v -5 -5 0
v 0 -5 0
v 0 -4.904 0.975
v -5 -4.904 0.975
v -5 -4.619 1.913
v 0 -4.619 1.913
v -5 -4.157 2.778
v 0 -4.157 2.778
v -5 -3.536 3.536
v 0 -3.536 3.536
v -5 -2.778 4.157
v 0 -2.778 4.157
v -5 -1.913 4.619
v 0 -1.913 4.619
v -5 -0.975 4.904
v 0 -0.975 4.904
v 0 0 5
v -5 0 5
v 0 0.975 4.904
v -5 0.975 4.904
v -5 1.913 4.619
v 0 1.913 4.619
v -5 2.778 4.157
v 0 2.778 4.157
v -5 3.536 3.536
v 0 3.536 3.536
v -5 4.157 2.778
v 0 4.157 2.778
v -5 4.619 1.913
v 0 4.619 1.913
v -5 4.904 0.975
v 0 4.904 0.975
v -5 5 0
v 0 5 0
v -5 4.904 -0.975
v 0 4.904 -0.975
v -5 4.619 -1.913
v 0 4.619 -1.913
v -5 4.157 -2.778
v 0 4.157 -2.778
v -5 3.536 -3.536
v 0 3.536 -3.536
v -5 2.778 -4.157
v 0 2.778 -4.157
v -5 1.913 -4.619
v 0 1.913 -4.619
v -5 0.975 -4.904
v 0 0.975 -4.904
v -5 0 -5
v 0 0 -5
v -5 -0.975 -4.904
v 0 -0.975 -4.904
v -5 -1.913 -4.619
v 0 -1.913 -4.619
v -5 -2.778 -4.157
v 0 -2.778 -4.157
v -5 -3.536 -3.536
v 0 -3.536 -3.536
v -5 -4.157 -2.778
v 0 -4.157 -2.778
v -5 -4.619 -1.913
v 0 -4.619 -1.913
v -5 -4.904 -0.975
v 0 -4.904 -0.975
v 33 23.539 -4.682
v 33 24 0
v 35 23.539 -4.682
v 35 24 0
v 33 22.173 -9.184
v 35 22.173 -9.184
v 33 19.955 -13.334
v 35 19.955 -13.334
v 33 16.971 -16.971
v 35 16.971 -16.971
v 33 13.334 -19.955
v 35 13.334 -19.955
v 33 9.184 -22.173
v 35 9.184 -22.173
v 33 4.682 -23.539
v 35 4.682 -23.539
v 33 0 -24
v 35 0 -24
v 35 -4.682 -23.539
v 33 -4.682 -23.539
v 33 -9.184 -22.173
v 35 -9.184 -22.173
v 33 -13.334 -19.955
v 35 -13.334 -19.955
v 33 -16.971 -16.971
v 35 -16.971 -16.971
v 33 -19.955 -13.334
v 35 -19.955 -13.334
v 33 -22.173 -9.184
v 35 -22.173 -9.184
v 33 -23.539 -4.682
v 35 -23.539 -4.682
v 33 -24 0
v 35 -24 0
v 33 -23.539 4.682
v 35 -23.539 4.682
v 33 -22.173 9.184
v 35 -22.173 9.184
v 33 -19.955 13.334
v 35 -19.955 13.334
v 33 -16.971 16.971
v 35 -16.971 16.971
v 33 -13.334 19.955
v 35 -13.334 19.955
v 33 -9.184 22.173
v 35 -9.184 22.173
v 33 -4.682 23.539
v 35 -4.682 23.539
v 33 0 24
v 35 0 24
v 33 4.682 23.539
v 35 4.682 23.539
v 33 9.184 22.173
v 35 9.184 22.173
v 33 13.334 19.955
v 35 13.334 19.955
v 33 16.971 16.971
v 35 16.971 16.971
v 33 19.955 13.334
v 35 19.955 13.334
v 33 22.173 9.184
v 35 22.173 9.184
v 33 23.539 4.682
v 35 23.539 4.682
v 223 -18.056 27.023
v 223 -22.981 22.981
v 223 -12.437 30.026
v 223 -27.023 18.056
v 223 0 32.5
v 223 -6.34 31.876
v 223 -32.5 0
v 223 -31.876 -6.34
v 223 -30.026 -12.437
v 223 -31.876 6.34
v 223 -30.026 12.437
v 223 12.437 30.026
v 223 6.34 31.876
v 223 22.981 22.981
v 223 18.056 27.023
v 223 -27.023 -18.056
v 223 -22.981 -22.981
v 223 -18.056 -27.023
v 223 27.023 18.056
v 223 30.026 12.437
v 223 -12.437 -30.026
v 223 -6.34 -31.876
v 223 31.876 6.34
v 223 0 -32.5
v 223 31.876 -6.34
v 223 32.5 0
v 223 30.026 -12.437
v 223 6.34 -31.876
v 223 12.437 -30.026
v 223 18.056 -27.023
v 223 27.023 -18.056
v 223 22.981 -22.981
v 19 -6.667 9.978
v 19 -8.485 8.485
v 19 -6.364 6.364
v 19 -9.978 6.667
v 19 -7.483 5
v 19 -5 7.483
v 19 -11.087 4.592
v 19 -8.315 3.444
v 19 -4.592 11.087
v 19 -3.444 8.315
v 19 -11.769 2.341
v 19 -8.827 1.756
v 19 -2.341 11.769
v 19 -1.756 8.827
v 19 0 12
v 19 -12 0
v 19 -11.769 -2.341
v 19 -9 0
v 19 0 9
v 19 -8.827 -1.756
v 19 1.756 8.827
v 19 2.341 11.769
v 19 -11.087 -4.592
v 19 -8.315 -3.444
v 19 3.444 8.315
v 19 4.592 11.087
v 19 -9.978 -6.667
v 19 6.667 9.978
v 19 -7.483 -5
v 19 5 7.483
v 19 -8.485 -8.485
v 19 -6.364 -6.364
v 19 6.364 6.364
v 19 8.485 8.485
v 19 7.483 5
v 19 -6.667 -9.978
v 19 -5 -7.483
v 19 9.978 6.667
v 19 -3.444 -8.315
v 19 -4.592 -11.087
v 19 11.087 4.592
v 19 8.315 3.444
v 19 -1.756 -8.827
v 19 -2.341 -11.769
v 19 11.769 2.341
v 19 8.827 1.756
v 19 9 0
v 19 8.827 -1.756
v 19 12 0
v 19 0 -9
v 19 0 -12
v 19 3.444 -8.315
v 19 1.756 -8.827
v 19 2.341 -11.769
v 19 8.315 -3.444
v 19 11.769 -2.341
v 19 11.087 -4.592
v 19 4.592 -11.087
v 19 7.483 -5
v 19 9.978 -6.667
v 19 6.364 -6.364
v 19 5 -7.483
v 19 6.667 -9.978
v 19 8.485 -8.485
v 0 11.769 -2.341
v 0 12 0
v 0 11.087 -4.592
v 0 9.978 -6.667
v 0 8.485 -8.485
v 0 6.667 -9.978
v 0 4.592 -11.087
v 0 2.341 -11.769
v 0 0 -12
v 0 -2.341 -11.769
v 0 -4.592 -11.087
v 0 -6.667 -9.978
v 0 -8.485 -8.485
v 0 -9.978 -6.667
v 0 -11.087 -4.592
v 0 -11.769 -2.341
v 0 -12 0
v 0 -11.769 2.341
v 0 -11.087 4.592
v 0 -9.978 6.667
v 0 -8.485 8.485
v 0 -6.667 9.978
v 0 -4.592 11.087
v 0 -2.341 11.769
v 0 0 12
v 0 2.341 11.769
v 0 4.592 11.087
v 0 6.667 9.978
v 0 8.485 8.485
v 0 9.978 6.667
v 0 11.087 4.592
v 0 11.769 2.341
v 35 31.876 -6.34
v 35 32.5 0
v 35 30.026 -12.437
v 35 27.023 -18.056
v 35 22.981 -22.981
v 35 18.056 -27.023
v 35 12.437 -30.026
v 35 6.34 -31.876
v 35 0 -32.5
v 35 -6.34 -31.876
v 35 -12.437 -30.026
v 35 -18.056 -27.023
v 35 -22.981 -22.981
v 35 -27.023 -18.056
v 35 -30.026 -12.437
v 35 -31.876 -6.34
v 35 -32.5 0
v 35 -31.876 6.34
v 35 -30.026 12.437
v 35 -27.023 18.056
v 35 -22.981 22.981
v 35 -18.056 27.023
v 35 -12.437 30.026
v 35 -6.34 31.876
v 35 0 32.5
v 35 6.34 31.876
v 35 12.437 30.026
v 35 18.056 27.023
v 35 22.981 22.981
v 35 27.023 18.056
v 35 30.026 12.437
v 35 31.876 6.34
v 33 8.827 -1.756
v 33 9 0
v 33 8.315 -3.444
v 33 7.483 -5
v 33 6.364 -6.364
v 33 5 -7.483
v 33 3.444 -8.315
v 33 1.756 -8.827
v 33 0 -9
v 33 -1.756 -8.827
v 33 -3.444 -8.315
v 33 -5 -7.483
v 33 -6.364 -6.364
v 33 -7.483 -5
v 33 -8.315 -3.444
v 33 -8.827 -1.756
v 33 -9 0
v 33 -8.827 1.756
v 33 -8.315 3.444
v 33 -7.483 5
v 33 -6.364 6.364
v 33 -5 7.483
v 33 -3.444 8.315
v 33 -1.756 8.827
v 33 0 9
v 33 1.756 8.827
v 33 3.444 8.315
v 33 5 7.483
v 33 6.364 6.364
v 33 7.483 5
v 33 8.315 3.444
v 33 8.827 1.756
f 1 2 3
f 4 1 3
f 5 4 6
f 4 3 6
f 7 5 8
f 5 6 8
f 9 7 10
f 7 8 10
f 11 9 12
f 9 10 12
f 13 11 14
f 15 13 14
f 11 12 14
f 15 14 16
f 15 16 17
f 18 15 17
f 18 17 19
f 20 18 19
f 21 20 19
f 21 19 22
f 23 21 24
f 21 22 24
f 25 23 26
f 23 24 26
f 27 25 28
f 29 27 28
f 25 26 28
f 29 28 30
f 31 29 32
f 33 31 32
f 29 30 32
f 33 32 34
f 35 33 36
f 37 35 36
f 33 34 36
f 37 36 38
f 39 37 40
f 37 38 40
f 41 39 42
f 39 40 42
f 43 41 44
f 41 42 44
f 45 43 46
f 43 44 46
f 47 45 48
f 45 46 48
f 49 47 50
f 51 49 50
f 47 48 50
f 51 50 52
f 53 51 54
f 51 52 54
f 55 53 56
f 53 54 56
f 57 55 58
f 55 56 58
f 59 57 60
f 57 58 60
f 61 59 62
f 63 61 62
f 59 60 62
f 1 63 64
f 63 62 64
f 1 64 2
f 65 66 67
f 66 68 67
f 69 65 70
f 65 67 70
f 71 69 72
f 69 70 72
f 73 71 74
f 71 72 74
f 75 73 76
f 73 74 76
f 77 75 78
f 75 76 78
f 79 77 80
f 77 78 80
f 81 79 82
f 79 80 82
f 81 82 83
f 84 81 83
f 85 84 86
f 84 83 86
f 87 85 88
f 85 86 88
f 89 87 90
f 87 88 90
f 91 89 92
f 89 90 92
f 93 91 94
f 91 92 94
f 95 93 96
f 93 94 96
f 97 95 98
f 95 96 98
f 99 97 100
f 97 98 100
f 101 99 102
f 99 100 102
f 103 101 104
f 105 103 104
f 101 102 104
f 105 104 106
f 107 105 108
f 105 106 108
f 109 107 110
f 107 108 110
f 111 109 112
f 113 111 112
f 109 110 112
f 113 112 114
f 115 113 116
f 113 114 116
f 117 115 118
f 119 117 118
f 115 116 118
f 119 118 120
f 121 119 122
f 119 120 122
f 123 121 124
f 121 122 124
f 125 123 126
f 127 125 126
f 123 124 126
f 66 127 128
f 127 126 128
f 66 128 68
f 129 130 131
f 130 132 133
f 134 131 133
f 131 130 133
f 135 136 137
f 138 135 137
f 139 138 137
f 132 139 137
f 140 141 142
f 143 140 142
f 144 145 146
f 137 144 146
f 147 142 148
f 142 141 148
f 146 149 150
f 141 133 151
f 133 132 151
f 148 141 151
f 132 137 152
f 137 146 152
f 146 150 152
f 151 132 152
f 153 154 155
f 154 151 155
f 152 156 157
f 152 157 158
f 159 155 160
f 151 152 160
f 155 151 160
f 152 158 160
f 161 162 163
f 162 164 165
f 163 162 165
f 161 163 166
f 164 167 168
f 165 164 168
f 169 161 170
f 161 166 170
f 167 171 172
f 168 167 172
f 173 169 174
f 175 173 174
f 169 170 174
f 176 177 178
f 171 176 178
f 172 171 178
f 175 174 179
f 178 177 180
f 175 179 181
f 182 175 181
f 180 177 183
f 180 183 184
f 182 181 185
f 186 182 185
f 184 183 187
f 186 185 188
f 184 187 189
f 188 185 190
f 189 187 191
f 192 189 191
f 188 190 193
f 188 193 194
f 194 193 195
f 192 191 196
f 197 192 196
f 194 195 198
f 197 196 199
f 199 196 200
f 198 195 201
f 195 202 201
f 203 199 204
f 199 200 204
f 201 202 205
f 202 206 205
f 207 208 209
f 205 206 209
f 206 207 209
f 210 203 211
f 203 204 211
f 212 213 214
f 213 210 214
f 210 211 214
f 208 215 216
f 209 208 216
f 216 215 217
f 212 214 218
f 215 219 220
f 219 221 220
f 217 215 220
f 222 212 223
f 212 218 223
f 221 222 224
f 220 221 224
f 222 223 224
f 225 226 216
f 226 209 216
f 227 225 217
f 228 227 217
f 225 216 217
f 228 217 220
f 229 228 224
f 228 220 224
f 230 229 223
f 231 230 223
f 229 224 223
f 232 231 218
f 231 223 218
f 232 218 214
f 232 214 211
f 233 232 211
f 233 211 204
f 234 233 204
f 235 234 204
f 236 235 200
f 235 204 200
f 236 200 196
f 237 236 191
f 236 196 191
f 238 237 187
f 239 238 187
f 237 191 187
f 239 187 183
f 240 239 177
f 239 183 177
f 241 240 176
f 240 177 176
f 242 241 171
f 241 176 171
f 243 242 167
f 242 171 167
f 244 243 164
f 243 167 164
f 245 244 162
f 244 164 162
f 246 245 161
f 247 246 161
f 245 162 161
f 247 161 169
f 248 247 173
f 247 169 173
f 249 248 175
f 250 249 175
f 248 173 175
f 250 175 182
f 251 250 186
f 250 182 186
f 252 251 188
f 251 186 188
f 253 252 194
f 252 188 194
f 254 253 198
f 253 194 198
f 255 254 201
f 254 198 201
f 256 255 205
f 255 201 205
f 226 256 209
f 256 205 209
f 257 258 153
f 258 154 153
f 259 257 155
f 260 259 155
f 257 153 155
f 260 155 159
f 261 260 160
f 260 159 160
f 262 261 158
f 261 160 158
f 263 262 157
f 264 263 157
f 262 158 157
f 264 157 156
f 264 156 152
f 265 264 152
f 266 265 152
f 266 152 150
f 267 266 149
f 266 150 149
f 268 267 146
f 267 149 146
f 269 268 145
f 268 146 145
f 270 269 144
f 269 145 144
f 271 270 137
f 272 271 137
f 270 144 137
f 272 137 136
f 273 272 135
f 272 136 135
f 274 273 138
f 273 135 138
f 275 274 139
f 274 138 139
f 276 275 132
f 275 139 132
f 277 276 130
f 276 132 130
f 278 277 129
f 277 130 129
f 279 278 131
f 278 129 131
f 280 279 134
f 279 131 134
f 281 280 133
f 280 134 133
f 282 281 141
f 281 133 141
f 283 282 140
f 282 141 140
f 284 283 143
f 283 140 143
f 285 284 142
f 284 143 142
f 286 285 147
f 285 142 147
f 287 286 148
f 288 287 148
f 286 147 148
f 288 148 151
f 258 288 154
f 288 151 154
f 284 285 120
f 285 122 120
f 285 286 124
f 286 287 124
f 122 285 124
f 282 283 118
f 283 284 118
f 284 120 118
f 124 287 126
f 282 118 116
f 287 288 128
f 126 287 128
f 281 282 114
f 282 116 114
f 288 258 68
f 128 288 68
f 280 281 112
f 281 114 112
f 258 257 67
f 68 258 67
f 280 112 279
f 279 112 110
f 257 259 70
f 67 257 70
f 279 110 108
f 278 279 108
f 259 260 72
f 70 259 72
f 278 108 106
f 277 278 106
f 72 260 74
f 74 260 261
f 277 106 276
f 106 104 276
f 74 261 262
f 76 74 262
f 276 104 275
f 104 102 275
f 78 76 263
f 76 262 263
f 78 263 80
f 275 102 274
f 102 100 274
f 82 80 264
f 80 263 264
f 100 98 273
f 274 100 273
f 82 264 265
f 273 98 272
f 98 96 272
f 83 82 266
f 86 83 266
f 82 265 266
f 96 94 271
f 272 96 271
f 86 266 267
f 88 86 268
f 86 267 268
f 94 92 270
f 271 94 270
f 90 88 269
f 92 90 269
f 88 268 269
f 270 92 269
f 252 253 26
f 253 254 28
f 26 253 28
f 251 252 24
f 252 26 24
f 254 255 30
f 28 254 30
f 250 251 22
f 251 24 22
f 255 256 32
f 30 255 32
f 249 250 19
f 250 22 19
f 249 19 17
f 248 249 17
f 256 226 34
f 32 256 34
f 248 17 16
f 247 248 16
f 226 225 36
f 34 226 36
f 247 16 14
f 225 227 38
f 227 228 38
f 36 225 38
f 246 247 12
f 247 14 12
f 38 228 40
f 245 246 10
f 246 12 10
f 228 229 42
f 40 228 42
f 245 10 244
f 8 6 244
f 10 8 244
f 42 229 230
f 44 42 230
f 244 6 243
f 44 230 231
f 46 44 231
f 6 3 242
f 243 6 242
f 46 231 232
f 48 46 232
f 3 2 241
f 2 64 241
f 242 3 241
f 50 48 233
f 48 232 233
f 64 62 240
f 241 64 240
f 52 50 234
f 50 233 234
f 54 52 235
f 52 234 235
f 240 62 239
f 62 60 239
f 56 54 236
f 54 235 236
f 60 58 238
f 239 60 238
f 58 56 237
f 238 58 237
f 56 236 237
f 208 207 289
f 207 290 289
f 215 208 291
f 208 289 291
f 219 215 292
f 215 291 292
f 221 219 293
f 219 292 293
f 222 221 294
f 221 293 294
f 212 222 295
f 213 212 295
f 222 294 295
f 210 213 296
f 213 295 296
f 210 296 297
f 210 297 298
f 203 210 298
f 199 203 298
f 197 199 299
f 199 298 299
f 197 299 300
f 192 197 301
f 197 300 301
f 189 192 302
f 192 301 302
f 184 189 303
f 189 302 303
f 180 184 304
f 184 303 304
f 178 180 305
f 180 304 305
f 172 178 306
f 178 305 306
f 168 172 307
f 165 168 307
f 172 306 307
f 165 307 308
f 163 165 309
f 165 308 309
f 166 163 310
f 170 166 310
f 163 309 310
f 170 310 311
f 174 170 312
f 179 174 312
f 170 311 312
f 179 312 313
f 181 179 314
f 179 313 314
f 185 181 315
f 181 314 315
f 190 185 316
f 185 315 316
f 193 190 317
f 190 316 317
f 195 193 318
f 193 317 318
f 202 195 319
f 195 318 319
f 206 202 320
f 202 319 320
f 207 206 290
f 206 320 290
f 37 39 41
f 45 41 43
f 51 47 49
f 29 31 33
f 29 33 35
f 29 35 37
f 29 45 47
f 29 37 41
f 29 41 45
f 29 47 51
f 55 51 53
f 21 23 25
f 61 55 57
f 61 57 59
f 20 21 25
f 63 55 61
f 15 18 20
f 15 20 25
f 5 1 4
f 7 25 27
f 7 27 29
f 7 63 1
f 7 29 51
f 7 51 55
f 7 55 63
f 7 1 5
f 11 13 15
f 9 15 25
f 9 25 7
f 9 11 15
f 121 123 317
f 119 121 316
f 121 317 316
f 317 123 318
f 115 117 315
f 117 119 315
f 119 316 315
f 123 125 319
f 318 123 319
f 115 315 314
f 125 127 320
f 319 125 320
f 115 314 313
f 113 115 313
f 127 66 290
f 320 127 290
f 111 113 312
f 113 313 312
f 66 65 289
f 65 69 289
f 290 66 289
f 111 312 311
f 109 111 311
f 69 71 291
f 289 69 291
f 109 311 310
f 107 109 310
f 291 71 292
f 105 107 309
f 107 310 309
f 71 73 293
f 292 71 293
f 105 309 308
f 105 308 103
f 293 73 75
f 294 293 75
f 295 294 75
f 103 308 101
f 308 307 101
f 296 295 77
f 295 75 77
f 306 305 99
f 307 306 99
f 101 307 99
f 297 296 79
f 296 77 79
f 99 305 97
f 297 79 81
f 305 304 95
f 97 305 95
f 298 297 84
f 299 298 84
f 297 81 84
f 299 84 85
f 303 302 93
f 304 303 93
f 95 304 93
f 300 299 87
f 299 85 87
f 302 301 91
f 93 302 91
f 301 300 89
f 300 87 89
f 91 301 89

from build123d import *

# Parameters (mm, degrees)
SKETCH_2_R      = 5
EXTRUDE_2_DEPTH = 5


with BuildPart() as part:
    # 草图1 → 旋转1 (revolve)
    with BuildSketch(Plane.XY):
        Polygon((0, 0), (0, 12), (19, 12), (19, 9), (33, 9), (33, 24), (35, 24), (35, 32.5), (223, 32.5), (223, 0), align=None)
    revolve(axis=Axis((223, 0, 0), (-1, 0, 0)))

    # 草图2 → 凸台-拉伸2 (add)
    with BuildSketch(Plane.ZY):
        with Locations(Location((0, 0, 0), (0, 0, 270))):
            Circle(SKETCH_2_R)
    extrude(amount=EXTRUDE_2_DEPTH)


solid = part.part
